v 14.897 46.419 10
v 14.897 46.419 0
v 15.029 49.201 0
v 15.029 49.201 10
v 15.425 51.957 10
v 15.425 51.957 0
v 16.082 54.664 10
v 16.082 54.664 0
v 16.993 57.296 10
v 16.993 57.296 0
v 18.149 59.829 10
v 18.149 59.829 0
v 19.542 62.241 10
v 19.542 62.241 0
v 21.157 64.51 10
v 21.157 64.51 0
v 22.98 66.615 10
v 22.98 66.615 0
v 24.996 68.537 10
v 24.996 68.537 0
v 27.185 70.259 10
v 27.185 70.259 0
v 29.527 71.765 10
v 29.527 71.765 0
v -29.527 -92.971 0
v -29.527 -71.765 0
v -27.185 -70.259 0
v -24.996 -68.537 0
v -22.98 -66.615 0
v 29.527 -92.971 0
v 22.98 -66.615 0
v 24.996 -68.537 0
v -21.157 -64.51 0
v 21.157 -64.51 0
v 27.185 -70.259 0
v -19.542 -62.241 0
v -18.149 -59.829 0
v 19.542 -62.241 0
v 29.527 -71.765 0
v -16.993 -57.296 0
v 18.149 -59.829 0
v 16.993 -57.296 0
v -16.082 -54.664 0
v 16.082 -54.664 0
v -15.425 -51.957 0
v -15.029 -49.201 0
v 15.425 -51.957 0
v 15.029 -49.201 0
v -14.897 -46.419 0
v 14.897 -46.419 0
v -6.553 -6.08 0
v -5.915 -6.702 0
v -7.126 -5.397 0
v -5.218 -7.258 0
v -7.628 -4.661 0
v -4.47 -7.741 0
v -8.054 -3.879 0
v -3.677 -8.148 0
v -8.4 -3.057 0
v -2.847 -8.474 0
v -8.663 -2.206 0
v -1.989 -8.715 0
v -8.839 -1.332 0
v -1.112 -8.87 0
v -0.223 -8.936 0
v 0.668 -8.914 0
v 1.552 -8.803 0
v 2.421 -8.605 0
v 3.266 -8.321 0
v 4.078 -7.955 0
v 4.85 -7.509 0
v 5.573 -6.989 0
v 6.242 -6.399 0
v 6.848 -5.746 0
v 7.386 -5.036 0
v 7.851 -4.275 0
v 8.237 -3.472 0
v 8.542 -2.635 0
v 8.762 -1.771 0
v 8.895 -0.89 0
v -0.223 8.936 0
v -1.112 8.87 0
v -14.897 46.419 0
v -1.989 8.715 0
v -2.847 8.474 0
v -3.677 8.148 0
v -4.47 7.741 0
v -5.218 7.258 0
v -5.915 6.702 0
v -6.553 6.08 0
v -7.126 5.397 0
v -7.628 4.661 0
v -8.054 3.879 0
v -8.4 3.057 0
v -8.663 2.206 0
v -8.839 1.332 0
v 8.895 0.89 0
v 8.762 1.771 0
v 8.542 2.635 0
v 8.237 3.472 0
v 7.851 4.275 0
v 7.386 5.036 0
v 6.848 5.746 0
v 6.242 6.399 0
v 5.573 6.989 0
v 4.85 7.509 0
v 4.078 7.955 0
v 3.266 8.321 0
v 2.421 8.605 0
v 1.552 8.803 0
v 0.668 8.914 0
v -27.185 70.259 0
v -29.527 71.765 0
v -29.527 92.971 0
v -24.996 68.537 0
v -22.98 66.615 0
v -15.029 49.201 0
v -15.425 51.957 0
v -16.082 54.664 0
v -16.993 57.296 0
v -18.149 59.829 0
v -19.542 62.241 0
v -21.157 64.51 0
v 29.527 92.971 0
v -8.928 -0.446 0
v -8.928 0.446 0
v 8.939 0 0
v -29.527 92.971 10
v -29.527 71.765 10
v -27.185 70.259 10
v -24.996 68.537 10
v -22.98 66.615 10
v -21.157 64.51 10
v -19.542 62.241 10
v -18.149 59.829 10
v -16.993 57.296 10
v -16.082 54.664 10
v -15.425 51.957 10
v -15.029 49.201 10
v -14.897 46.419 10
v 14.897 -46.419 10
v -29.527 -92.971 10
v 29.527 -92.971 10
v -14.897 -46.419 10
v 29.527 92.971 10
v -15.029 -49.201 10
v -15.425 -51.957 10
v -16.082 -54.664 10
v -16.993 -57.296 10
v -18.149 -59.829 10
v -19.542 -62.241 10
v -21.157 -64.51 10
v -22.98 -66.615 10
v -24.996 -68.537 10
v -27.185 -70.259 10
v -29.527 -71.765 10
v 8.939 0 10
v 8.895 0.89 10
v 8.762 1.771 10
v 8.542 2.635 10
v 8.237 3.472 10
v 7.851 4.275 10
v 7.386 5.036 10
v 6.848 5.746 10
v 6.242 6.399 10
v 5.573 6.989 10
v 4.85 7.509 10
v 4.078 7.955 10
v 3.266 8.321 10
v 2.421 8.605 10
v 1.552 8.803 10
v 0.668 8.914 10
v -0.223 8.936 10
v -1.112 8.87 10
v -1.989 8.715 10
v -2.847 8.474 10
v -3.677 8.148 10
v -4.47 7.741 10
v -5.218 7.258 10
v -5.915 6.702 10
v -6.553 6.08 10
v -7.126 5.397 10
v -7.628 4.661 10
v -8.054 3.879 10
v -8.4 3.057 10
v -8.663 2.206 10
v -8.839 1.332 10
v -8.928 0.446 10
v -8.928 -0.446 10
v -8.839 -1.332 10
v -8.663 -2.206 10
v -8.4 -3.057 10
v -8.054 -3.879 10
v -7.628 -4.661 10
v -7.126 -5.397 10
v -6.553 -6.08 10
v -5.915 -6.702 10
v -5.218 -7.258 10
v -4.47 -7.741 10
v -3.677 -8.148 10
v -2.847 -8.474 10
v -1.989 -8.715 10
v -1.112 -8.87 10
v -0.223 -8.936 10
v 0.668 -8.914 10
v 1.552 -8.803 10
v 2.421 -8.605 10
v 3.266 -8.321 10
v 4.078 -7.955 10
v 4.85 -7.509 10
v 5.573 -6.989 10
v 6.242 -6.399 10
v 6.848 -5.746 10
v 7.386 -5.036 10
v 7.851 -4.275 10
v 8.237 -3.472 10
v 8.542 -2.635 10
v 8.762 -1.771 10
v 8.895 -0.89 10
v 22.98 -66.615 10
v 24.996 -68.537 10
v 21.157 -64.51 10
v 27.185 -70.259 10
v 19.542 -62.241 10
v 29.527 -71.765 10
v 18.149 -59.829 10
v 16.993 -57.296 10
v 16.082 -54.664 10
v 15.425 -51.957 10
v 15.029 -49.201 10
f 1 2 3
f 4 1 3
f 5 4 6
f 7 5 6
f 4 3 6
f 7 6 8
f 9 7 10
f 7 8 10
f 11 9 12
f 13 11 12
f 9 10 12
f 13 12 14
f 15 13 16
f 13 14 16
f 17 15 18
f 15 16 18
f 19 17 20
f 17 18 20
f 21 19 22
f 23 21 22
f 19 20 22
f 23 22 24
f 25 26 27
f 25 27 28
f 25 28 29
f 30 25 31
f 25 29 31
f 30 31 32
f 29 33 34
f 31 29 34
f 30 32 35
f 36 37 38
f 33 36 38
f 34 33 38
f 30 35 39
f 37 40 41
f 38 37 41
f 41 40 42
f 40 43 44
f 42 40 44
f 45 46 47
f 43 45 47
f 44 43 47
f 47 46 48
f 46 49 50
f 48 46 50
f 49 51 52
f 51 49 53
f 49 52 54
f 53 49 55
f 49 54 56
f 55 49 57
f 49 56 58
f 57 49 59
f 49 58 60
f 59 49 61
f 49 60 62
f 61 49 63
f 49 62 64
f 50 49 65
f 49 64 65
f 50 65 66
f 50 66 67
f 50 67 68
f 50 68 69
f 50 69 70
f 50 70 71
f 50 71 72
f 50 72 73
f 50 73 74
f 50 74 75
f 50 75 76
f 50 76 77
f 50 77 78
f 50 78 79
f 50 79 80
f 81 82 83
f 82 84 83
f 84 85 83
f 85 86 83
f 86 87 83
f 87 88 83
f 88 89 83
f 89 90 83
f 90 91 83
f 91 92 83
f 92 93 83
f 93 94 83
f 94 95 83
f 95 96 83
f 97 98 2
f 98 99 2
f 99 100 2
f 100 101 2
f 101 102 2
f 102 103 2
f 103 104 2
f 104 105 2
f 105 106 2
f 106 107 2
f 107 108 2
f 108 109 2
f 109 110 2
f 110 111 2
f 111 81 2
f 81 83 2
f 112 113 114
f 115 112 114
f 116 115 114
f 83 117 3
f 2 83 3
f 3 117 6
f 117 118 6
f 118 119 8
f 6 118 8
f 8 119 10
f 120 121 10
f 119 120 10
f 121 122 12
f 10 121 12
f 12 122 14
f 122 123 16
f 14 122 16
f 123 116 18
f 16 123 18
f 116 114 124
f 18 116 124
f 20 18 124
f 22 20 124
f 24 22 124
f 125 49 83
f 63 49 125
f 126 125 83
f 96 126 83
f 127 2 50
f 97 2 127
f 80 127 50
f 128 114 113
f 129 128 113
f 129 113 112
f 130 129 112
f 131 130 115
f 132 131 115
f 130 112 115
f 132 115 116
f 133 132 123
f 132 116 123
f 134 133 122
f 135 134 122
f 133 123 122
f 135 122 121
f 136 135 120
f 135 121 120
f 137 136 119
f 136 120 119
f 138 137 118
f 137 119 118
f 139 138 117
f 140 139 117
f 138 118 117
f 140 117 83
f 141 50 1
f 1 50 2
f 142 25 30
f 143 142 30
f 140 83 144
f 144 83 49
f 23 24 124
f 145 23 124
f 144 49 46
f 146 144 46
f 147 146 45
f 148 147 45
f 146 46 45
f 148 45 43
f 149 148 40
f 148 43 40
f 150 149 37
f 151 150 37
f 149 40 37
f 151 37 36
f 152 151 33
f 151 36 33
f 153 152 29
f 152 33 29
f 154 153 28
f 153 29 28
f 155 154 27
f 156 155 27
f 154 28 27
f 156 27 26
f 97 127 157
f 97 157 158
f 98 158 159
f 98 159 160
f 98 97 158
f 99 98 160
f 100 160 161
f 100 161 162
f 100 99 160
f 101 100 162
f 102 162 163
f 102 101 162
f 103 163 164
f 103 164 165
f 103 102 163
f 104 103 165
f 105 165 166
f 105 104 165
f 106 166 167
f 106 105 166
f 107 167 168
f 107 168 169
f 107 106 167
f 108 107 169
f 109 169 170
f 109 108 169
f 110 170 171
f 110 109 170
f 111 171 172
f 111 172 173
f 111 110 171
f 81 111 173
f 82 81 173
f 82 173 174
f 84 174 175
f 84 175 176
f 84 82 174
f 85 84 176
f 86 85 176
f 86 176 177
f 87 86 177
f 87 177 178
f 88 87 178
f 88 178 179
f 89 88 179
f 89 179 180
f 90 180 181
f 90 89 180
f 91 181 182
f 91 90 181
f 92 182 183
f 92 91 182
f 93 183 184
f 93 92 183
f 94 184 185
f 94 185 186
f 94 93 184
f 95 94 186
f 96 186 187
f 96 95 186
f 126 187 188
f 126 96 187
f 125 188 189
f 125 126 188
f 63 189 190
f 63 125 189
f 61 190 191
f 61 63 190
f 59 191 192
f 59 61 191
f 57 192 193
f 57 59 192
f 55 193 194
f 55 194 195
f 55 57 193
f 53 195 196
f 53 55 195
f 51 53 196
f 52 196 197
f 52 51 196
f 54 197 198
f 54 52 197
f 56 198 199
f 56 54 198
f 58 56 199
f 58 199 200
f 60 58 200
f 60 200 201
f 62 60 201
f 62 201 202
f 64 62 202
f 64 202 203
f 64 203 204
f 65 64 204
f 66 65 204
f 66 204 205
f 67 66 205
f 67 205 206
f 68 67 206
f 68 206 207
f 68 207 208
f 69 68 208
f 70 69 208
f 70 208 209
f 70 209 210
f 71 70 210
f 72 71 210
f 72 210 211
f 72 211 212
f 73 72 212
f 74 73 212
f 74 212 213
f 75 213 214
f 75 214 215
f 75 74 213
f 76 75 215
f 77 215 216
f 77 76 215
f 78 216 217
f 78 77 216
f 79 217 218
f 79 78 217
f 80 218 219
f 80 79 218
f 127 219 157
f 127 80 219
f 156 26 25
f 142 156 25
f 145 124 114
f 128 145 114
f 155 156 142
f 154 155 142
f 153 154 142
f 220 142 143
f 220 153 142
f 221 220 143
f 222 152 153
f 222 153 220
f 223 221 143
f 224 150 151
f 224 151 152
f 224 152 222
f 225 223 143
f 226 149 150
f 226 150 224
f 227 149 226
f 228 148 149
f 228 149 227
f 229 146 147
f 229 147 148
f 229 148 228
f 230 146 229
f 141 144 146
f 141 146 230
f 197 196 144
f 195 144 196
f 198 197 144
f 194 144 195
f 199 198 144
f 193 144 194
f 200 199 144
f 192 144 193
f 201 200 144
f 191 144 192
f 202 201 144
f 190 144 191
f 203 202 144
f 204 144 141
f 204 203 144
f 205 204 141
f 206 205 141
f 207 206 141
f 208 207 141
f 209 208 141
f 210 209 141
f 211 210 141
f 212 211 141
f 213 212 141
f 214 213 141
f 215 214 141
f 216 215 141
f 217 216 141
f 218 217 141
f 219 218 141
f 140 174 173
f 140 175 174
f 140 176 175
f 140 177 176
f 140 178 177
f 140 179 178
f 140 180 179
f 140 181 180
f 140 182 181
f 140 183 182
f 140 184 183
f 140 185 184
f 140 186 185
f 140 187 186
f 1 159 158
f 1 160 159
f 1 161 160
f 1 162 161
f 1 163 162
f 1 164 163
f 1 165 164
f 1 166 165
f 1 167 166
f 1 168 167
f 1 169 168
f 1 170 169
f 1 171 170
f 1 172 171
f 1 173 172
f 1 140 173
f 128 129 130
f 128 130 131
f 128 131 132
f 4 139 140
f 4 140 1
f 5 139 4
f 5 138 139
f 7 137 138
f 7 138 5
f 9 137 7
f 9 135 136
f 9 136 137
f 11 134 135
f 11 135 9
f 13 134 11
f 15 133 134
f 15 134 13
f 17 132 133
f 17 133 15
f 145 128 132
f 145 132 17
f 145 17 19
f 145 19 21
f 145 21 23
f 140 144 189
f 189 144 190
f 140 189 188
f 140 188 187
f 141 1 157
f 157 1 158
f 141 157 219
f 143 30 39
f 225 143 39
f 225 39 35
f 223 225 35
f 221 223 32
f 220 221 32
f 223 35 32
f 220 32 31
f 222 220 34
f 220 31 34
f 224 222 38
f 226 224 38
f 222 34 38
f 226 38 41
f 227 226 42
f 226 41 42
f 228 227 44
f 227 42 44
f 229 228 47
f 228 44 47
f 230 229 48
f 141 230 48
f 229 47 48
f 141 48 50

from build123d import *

# Parameters (mm, degrees)
SKETCH1_R           = 8.939106544
BOSS_EXTRUDE1_DEPTH = 10


with BuildPart() as part:
    # Sketch1 → Boss-Extrude1 (new body)
    with BuildSketch(Plane.XY):
        with BuildLine():
            Line((29.527184843, 92.970730655), (-29.527184843, 92.970730655))
            Line((-29.527184843, 92.970730655), (-29.527184843, 71.764892873))
            ThreePointArc((-29.527184843, 71.764892873), (-18.816760055, 61.051662511), (-14.896597759, 46.418862659))
            Line((-14.896597759, 46.418862659), (-14.896597759, -46.418862659))
            ThreePointArc((-14.896597759, -46.418862659), (-18.816760055, -61.051662511), (-29.527184843, -71.764892873))
            Line((-29.527184843, -71.764892873), (-29.527184843, -92.970730655))
            Line((-29.527184843, -92.970730655), (29.527184843, -92.970730655))
            Line((29.527184843, -92.970730655), (29.527184843, -71.764892873))
            ThreePointArc((29.527184843, -71.764892873), (18.816760055, -61.051662511), (14.896597759, -46.418862659))
            Line((14.896597759, -46.418862659), (14.896597759, 46.418862659))
            ThreePointArc((14.896597759, 46.418862659), (18.816760055, 61.051662511), (29.527184843, 71.764892873))
            Line((29.527184843, 71.764892873), (29.527184843, 92.970730655))
        make_face()
        Circle(SKETCH1_R, mode=Mode.SUBTRACT)
    extrude(amount=BOSS_EXTRUDE1_DEPTH)


solid = part.part
